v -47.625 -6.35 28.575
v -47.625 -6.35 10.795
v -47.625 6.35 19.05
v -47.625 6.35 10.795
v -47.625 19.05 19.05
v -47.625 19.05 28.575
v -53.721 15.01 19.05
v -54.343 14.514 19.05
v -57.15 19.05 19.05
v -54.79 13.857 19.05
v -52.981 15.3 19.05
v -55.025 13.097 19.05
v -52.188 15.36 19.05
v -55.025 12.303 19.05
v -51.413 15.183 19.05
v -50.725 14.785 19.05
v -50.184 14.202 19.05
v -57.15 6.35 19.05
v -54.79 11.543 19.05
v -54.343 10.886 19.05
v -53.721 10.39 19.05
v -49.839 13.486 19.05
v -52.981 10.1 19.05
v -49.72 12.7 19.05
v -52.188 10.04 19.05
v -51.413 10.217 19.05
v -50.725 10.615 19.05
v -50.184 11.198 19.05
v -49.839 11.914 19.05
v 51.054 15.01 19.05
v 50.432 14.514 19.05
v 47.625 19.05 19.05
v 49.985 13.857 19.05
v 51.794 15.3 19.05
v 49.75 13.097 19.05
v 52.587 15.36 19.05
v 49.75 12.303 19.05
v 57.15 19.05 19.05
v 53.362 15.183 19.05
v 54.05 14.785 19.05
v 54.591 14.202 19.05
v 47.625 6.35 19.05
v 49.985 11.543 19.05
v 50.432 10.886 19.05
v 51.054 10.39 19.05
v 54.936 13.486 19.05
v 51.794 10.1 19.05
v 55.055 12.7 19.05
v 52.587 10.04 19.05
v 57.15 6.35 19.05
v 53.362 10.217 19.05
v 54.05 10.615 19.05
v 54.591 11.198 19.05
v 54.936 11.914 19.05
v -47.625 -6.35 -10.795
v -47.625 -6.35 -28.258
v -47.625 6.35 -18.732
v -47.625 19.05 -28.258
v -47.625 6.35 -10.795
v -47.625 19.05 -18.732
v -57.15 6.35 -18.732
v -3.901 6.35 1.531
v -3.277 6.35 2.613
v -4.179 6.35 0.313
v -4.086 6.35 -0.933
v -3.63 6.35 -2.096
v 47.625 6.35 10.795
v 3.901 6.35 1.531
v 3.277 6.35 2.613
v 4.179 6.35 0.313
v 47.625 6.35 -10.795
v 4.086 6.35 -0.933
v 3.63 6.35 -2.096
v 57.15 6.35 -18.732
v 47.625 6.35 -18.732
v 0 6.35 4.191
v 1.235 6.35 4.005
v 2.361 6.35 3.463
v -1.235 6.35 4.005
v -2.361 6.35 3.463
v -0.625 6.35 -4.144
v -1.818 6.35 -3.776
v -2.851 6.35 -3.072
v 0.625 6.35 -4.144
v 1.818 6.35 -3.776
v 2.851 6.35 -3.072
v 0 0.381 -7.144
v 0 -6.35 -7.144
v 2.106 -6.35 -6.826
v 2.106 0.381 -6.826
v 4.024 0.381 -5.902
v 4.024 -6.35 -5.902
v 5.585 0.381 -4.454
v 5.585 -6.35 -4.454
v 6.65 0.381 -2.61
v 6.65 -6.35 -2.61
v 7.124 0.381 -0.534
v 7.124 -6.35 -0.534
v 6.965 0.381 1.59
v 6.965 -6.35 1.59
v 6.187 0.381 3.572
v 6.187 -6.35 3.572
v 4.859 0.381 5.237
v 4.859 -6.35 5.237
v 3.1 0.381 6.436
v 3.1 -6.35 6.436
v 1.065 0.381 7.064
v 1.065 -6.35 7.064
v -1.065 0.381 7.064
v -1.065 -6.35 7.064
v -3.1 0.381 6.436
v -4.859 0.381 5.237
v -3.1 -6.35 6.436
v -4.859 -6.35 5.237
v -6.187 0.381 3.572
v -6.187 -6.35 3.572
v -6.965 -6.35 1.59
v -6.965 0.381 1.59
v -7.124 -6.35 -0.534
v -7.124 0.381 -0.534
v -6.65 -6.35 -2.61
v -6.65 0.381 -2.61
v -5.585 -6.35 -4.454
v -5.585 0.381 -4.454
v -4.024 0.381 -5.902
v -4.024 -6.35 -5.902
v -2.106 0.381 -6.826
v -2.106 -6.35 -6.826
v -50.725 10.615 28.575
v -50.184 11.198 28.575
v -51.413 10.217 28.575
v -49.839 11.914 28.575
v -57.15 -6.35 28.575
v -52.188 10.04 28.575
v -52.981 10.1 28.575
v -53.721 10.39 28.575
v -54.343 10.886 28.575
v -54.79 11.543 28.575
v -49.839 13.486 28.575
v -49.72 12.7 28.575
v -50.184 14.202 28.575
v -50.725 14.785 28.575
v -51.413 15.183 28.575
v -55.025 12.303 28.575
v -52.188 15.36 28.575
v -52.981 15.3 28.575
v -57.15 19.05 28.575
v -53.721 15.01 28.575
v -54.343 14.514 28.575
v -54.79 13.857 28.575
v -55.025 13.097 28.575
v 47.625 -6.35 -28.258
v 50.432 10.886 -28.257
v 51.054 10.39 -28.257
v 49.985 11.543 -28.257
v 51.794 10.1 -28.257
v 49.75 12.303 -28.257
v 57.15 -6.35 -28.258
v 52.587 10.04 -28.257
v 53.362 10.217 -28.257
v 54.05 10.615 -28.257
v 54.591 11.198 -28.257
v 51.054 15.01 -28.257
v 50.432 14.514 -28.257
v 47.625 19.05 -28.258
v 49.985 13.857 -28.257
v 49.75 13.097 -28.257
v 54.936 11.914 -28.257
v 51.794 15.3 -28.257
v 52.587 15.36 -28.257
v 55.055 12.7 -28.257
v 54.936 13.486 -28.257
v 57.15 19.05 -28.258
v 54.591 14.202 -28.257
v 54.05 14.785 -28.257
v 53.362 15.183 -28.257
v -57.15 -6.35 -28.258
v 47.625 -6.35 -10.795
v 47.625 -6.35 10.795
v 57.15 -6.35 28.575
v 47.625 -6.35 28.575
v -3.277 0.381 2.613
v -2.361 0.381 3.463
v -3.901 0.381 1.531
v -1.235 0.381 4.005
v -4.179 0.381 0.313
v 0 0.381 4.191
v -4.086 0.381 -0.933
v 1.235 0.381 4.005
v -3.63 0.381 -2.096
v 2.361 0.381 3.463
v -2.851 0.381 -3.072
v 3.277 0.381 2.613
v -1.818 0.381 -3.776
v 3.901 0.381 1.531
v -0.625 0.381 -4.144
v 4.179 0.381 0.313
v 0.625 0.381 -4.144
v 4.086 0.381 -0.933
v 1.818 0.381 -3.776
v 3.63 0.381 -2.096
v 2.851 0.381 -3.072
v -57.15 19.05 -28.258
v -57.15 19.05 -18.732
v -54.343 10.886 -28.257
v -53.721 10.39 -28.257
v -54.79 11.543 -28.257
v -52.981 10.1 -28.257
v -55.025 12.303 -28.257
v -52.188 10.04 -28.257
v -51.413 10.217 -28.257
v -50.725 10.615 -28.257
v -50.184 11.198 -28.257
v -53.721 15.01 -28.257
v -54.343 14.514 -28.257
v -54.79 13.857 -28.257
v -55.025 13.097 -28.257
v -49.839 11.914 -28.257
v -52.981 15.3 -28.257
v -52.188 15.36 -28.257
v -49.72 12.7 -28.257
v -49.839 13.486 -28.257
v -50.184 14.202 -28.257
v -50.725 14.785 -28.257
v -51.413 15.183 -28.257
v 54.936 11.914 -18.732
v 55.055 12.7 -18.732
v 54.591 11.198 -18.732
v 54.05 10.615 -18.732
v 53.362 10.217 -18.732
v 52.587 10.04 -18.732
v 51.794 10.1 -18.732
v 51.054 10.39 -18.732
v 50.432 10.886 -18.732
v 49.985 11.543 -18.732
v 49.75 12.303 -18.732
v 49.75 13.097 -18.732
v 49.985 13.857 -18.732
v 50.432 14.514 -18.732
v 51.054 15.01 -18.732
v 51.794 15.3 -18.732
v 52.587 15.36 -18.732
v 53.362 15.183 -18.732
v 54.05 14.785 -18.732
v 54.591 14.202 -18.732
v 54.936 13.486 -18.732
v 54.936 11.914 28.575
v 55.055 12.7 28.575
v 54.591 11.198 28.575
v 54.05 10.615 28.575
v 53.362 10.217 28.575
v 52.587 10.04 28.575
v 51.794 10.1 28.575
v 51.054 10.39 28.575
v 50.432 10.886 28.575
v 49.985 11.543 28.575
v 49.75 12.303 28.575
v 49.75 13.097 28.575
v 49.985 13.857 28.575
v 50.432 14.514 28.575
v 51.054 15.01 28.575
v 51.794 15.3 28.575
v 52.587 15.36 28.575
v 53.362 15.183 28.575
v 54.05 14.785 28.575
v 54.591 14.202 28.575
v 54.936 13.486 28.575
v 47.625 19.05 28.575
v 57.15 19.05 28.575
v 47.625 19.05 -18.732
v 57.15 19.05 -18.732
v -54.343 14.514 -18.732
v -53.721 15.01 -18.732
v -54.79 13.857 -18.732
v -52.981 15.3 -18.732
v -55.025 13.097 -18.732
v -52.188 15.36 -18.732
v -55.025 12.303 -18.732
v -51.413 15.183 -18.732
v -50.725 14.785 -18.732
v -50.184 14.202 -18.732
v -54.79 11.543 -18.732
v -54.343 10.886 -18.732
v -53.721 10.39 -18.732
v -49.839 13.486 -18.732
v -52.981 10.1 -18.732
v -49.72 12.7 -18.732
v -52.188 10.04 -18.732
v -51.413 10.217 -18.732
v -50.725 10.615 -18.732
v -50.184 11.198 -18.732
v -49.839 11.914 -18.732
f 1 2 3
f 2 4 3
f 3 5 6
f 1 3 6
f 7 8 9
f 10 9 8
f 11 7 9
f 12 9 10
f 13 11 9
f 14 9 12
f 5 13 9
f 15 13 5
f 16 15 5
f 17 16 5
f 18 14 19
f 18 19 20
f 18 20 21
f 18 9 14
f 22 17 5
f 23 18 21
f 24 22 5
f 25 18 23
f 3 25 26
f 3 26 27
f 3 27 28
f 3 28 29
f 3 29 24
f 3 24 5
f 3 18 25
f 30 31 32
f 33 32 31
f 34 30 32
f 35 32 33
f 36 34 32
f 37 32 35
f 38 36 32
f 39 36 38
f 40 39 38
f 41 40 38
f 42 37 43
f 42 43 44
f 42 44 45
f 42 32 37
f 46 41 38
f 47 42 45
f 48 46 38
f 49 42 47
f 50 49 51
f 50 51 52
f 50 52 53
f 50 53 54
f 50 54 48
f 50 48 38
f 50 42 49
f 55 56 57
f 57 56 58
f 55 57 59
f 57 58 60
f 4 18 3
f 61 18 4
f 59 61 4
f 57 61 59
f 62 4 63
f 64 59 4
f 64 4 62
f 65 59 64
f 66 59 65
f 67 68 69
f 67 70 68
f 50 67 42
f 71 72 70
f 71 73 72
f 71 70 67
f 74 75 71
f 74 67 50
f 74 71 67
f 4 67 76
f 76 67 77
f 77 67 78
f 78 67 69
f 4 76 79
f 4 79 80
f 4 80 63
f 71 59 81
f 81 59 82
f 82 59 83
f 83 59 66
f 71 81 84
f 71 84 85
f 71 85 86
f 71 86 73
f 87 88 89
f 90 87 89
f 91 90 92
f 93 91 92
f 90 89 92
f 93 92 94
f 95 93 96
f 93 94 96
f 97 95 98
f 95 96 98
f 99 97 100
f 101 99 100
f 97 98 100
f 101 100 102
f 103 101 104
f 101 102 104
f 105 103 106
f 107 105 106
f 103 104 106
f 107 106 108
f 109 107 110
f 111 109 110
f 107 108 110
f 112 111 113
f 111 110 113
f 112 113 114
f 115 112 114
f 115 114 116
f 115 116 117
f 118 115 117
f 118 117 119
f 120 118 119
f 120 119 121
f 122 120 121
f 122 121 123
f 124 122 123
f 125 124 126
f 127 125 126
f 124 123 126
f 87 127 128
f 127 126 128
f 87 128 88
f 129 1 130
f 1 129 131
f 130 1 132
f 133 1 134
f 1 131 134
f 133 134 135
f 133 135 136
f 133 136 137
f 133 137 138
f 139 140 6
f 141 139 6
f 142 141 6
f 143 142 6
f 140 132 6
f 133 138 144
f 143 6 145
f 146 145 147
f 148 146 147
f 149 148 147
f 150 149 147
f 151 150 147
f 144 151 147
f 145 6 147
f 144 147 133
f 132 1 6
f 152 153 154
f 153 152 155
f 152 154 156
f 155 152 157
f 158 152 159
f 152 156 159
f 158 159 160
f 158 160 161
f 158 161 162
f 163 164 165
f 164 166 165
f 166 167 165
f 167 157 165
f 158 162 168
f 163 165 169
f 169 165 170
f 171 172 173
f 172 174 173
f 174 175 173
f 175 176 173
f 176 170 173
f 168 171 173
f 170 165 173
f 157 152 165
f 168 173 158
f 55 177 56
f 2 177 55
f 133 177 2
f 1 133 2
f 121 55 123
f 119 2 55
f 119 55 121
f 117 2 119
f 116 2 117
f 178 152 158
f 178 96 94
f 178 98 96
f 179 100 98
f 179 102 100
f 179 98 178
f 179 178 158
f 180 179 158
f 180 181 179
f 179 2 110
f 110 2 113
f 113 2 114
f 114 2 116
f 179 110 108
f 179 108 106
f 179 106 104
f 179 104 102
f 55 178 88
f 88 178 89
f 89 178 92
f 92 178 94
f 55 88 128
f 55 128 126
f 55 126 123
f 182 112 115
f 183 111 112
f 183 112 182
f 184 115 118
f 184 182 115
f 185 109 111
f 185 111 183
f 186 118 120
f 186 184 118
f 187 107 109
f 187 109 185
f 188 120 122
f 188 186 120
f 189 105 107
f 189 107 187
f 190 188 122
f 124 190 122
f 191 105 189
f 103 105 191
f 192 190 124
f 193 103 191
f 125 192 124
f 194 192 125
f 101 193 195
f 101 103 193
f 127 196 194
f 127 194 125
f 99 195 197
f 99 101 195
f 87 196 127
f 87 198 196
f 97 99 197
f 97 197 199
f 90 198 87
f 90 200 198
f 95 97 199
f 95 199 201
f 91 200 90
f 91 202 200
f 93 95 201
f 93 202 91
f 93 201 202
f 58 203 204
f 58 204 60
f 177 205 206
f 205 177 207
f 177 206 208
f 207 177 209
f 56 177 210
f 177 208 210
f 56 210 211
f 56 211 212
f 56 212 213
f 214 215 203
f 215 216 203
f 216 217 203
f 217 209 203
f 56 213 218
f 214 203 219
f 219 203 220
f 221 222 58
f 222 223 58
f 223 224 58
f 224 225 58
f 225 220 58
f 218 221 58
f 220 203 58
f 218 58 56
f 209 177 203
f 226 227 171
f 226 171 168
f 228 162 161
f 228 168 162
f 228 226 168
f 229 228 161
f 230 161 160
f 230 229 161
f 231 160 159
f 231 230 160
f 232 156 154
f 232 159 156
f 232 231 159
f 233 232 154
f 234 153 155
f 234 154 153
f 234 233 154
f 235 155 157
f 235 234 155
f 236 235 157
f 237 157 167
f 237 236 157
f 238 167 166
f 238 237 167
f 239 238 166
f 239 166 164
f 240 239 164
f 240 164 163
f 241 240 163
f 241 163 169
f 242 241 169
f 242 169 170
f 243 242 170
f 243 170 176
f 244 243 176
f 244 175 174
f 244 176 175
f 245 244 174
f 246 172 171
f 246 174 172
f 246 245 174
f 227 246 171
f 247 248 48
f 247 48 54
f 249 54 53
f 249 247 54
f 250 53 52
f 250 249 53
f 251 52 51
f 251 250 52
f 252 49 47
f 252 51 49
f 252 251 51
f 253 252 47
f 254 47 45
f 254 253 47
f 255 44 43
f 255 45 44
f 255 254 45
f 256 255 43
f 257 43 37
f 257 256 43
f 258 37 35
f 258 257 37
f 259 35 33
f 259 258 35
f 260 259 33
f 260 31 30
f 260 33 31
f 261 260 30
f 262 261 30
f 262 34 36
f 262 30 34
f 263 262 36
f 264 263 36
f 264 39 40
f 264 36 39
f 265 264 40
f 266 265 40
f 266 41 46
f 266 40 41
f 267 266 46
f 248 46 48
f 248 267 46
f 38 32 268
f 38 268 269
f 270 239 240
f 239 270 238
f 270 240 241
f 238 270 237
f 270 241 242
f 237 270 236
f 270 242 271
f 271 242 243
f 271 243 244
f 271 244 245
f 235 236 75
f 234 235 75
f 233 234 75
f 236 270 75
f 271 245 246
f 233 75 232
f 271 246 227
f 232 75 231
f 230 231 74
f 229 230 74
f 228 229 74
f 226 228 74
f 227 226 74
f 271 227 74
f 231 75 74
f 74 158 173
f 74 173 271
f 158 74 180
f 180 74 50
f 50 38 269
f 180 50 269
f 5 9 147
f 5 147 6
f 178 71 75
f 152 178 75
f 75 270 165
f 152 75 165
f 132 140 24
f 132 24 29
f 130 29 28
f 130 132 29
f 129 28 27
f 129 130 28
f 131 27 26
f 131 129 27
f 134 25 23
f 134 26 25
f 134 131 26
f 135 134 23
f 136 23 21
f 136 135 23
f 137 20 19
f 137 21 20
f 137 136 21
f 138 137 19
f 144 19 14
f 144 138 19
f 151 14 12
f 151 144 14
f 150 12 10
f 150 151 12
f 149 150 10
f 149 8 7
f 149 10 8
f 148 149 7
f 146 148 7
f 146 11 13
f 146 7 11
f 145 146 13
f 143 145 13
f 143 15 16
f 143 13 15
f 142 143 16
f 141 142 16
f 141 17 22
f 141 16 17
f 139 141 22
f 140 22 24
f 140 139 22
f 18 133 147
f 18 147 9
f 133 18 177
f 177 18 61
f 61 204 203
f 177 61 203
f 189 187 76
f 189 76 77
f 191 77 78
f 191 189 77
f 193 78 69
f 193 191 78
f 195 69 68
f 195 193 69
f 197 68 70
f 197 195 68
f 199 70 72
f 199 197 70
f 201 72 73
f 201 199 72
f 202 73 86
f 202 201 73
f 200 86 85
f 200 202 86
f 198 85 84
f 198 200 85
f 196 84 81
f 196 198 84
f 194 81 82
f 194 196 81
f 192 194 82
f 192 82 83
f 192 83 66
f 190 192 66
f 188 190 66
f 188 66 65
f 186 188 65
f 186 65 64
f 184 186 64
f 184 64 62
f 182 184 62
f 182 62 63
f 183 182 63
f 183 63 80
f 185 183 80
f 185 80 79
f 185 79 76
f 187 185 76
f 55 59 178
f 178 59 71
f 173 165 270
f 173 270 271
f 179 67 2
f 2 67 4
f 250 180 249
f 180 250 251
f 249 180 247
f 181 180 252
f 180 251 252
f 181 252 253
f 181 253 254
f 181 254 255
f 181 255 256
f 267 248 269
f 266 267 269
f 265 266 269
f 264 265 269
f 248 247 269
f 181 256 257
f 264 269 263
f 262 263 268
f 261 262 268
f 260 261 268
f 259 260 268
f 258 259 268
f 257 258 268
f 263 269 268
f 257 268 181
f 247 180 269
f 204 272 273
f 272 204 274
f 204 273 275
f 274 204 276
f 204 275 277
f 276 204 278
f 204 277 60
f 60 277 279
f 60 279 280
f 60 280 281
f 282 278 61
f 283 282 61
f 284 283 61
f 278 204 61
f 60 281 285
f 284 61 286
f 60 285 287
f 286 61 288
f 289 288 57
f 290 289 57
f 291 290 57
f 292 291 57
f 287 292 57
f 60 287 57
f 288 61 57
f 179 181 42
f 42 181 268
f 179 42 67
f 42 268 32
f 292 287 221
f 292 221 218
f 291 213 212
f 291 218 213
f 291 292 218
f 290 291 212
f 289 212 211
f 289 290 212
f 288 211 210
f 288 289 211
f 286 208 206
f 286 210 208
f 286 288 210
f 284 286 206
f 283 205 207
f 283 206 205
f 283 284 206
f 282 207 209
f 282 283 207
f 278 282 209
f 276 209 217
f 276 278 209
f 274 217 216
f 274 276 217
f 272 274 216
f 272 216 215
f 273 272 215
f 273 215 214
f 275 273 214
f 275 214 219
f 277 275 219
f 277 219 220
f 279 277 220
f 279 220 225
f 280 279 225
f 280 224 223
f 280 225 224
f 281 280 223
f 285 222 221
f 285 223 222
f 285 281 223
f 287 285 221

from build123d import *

# Parameters (mm, degrees)
SKETCH1_W               = 114.3
SKETCH1_H               = 21.59
SKETCH1_R               = 4.191
BOSS_EXTRUDE1_DEPTH     = 6.35
SKETCH2_W               = 9.525
SKETCH2_H               = 6.35
BOSS_EXTRUDE2_DEPTH     = 17.4625
SKETCH3_W               = 9.525
SKETCH3_H               = 6.35
BOSS_EXTRUDE3_DEPTH     = 17.4625
SKETCH4_W               = 9.525
SKETCH4_H               = 6.35
BOSS_EXTRUDE4_DEPTH     = 17.78
SKETCH6_W               = 9.525
SKETCH6_H               = 9.525
BOSS_EXTRUDE5_DEPTH     = 12.7
CUT_EXTRUDE1_DEPTH      = 53.848
CUT_EXTRUDE1_DEPTH_BACK = 92.456
SKETCH7_R               = 2.667
BOSS_EXTRUDE6_DEPTH     = 6.35
CUT_EXTRUDE2_START      = -6.35
SKETCH10_R              = 4.191
CUT_EXTRUDE2_DEPTH      = 6.35
SKETCH11_R              = 7.14375
CUT_EXTRUDE3_DEPTH      = 6.73125


with BuildPart() as part:
    # Sketch1 → Boss-Extrude1 (new body)
    with BuildSketch(Plane(origin=(0, 0, 0), x_dir=(1, 0, 0), z_dir=(0, 1, 0))):
        Rectangle(SKETCH1_W, SKETCH1_H)
        with Locations(Location((0, 0, 0), (0, 0, 270))):
            Circle(SKETCH1_R, mode=Mode.SUBTRACT)
    extrude(amount=BOSS_EXTRUDE1_DEPTH)

    # Sketch2 → Boss-Extrude2 (add)
    with BuildSketch(Plane(origin=(0, 0, -10.795), x_dir=(-1, 0, 0), z_dir=(0, 0, -1))):
        with Locations((-52.3875, 3.175)):
            Rectangle(SKETCH2_W, SKETCH2_H)
    extrude(amount=BOSS_EXTRUDE2_DEPTH)

    # Sketch3 → Boss-Extrude3 (add)
    with BuildSketch(Plane(origin=(0, 0, -10.795), x_dir=(-1, 0, 0), z_dir=(0, 0, -1))):
        with Locations((52.3875, 3.175)):
            Rectangle(SKETCH3_W, SKETCH3_H)
    extrude(amount=BOSS_EXTRUDE3_DEPTH)

    # Sketch4 → Boss-Extrude4 (add)
    with BuildSketch(Plane.XY.offset(10.795)):
        with Locations((-52.3875, 3.175)):
            Rectangle(SKETCH4_W, SKETCH4_H)
        with Locations((52.3875, 3.175)):
            Rectangle(SKETCH4_W, SKETCH4_H)
    extrude(amount=BOSS_EXTRUDE4_DEPTH)

    # Sketch6 → Boss-Extrude5 (add)
    with BuildSketch(Plane(origin=(0, 6.35, 0), x_dir=(1, 0, 0), z_dir=(0, 1, 0))):
        with Locations((-52.3875, 23.495)):
            Rectangle(SKETCH6_W, SKETCH6_H)
        with Locations((-52.3875, -23.8125)):
            Rectangle(SKETCH6_W, SKETCH6_H)
        with Locations((52.3875, 23.495)):
            Rectangle(SKETCH6_W, SKETCH6_H)
        with Locations((52.3875, -23.8125)):
            Rectangle(SKETCH6_W, SKETCH6_H)
    extrude(amount=BOSS_EXTRUDE5_DEPTH)

    # Sketch7 → Cut-Extrude1 (cut, two sides: drawn at the far end of the back side and taken through both)
    with BuildSketch(Plane(origin=(0, 0, -28.2575), x_dir=(-1, 0, 0), z_dir=(0, 0, -1)).offset(-CUT_EXTRUDE1_DEPTH_BACK)):
        with Locations(Location((-52.3875, 12.7, 0), (0, 0, 180))):
            Circle(SKETCH7_R)
        with Locations(Location((52.3875, 12.7, 0), (0, 0, 180))):
            Circle(SKETCH7_R)
    extrude(amount=CUT_EXTRUDE1_DEPTH + CUT_EXTRUDE1_DEPTH_BACK, mode=Mode.SUBTRACT)

    # Sketch9 → Boss-Extrude6 (add)
    with BuildSketch(Plane.XZ):
        Polygon((57.15, -28.2575), (57.15, 28.575), (47.625, 28.575), (47.625, 10.795), (-47.625, 10.795), (-47.625, 28.575), (-57.15, 28.575), (-57.15, -28.2575), (-47.625, -28.2575), (-47.625, -10.795), (47.625, -10.795), (47.625, -28.2575), align=None)
    extrude(amount=BOSS_EXTRUDE6_DEPTH)

    # Sketch10 → Cut-Extrude2 (cut)
    with BuildSketch(Plane(origin=(0, 0, 0), x_dir=(1, 0, 0), z_dir=(0, 1, 0)).offset(CUT_EXTRUDE2_START)):
        with Locations(Location((0, 0, 0), (0, 0, 90))):
            Circle(SKETCH10_R)
    extrude(amount=CUT_EXTRUDE2_DEPTH, mode=Mode.SUBTRACT)

    # Sketch11 → Cut-Extrude3 (cut)
    with BuildSketch(Plane.XZ.offset(6.35)):
        with Locations(Location((0, 0, 0), (0, 0, 270))):
            Circle(SKETCH11_R)
    extrude(amount=-CUT_EXTRUDE3_DEPTH, mode=Mode.SUBTRACT)


solid = part.part
